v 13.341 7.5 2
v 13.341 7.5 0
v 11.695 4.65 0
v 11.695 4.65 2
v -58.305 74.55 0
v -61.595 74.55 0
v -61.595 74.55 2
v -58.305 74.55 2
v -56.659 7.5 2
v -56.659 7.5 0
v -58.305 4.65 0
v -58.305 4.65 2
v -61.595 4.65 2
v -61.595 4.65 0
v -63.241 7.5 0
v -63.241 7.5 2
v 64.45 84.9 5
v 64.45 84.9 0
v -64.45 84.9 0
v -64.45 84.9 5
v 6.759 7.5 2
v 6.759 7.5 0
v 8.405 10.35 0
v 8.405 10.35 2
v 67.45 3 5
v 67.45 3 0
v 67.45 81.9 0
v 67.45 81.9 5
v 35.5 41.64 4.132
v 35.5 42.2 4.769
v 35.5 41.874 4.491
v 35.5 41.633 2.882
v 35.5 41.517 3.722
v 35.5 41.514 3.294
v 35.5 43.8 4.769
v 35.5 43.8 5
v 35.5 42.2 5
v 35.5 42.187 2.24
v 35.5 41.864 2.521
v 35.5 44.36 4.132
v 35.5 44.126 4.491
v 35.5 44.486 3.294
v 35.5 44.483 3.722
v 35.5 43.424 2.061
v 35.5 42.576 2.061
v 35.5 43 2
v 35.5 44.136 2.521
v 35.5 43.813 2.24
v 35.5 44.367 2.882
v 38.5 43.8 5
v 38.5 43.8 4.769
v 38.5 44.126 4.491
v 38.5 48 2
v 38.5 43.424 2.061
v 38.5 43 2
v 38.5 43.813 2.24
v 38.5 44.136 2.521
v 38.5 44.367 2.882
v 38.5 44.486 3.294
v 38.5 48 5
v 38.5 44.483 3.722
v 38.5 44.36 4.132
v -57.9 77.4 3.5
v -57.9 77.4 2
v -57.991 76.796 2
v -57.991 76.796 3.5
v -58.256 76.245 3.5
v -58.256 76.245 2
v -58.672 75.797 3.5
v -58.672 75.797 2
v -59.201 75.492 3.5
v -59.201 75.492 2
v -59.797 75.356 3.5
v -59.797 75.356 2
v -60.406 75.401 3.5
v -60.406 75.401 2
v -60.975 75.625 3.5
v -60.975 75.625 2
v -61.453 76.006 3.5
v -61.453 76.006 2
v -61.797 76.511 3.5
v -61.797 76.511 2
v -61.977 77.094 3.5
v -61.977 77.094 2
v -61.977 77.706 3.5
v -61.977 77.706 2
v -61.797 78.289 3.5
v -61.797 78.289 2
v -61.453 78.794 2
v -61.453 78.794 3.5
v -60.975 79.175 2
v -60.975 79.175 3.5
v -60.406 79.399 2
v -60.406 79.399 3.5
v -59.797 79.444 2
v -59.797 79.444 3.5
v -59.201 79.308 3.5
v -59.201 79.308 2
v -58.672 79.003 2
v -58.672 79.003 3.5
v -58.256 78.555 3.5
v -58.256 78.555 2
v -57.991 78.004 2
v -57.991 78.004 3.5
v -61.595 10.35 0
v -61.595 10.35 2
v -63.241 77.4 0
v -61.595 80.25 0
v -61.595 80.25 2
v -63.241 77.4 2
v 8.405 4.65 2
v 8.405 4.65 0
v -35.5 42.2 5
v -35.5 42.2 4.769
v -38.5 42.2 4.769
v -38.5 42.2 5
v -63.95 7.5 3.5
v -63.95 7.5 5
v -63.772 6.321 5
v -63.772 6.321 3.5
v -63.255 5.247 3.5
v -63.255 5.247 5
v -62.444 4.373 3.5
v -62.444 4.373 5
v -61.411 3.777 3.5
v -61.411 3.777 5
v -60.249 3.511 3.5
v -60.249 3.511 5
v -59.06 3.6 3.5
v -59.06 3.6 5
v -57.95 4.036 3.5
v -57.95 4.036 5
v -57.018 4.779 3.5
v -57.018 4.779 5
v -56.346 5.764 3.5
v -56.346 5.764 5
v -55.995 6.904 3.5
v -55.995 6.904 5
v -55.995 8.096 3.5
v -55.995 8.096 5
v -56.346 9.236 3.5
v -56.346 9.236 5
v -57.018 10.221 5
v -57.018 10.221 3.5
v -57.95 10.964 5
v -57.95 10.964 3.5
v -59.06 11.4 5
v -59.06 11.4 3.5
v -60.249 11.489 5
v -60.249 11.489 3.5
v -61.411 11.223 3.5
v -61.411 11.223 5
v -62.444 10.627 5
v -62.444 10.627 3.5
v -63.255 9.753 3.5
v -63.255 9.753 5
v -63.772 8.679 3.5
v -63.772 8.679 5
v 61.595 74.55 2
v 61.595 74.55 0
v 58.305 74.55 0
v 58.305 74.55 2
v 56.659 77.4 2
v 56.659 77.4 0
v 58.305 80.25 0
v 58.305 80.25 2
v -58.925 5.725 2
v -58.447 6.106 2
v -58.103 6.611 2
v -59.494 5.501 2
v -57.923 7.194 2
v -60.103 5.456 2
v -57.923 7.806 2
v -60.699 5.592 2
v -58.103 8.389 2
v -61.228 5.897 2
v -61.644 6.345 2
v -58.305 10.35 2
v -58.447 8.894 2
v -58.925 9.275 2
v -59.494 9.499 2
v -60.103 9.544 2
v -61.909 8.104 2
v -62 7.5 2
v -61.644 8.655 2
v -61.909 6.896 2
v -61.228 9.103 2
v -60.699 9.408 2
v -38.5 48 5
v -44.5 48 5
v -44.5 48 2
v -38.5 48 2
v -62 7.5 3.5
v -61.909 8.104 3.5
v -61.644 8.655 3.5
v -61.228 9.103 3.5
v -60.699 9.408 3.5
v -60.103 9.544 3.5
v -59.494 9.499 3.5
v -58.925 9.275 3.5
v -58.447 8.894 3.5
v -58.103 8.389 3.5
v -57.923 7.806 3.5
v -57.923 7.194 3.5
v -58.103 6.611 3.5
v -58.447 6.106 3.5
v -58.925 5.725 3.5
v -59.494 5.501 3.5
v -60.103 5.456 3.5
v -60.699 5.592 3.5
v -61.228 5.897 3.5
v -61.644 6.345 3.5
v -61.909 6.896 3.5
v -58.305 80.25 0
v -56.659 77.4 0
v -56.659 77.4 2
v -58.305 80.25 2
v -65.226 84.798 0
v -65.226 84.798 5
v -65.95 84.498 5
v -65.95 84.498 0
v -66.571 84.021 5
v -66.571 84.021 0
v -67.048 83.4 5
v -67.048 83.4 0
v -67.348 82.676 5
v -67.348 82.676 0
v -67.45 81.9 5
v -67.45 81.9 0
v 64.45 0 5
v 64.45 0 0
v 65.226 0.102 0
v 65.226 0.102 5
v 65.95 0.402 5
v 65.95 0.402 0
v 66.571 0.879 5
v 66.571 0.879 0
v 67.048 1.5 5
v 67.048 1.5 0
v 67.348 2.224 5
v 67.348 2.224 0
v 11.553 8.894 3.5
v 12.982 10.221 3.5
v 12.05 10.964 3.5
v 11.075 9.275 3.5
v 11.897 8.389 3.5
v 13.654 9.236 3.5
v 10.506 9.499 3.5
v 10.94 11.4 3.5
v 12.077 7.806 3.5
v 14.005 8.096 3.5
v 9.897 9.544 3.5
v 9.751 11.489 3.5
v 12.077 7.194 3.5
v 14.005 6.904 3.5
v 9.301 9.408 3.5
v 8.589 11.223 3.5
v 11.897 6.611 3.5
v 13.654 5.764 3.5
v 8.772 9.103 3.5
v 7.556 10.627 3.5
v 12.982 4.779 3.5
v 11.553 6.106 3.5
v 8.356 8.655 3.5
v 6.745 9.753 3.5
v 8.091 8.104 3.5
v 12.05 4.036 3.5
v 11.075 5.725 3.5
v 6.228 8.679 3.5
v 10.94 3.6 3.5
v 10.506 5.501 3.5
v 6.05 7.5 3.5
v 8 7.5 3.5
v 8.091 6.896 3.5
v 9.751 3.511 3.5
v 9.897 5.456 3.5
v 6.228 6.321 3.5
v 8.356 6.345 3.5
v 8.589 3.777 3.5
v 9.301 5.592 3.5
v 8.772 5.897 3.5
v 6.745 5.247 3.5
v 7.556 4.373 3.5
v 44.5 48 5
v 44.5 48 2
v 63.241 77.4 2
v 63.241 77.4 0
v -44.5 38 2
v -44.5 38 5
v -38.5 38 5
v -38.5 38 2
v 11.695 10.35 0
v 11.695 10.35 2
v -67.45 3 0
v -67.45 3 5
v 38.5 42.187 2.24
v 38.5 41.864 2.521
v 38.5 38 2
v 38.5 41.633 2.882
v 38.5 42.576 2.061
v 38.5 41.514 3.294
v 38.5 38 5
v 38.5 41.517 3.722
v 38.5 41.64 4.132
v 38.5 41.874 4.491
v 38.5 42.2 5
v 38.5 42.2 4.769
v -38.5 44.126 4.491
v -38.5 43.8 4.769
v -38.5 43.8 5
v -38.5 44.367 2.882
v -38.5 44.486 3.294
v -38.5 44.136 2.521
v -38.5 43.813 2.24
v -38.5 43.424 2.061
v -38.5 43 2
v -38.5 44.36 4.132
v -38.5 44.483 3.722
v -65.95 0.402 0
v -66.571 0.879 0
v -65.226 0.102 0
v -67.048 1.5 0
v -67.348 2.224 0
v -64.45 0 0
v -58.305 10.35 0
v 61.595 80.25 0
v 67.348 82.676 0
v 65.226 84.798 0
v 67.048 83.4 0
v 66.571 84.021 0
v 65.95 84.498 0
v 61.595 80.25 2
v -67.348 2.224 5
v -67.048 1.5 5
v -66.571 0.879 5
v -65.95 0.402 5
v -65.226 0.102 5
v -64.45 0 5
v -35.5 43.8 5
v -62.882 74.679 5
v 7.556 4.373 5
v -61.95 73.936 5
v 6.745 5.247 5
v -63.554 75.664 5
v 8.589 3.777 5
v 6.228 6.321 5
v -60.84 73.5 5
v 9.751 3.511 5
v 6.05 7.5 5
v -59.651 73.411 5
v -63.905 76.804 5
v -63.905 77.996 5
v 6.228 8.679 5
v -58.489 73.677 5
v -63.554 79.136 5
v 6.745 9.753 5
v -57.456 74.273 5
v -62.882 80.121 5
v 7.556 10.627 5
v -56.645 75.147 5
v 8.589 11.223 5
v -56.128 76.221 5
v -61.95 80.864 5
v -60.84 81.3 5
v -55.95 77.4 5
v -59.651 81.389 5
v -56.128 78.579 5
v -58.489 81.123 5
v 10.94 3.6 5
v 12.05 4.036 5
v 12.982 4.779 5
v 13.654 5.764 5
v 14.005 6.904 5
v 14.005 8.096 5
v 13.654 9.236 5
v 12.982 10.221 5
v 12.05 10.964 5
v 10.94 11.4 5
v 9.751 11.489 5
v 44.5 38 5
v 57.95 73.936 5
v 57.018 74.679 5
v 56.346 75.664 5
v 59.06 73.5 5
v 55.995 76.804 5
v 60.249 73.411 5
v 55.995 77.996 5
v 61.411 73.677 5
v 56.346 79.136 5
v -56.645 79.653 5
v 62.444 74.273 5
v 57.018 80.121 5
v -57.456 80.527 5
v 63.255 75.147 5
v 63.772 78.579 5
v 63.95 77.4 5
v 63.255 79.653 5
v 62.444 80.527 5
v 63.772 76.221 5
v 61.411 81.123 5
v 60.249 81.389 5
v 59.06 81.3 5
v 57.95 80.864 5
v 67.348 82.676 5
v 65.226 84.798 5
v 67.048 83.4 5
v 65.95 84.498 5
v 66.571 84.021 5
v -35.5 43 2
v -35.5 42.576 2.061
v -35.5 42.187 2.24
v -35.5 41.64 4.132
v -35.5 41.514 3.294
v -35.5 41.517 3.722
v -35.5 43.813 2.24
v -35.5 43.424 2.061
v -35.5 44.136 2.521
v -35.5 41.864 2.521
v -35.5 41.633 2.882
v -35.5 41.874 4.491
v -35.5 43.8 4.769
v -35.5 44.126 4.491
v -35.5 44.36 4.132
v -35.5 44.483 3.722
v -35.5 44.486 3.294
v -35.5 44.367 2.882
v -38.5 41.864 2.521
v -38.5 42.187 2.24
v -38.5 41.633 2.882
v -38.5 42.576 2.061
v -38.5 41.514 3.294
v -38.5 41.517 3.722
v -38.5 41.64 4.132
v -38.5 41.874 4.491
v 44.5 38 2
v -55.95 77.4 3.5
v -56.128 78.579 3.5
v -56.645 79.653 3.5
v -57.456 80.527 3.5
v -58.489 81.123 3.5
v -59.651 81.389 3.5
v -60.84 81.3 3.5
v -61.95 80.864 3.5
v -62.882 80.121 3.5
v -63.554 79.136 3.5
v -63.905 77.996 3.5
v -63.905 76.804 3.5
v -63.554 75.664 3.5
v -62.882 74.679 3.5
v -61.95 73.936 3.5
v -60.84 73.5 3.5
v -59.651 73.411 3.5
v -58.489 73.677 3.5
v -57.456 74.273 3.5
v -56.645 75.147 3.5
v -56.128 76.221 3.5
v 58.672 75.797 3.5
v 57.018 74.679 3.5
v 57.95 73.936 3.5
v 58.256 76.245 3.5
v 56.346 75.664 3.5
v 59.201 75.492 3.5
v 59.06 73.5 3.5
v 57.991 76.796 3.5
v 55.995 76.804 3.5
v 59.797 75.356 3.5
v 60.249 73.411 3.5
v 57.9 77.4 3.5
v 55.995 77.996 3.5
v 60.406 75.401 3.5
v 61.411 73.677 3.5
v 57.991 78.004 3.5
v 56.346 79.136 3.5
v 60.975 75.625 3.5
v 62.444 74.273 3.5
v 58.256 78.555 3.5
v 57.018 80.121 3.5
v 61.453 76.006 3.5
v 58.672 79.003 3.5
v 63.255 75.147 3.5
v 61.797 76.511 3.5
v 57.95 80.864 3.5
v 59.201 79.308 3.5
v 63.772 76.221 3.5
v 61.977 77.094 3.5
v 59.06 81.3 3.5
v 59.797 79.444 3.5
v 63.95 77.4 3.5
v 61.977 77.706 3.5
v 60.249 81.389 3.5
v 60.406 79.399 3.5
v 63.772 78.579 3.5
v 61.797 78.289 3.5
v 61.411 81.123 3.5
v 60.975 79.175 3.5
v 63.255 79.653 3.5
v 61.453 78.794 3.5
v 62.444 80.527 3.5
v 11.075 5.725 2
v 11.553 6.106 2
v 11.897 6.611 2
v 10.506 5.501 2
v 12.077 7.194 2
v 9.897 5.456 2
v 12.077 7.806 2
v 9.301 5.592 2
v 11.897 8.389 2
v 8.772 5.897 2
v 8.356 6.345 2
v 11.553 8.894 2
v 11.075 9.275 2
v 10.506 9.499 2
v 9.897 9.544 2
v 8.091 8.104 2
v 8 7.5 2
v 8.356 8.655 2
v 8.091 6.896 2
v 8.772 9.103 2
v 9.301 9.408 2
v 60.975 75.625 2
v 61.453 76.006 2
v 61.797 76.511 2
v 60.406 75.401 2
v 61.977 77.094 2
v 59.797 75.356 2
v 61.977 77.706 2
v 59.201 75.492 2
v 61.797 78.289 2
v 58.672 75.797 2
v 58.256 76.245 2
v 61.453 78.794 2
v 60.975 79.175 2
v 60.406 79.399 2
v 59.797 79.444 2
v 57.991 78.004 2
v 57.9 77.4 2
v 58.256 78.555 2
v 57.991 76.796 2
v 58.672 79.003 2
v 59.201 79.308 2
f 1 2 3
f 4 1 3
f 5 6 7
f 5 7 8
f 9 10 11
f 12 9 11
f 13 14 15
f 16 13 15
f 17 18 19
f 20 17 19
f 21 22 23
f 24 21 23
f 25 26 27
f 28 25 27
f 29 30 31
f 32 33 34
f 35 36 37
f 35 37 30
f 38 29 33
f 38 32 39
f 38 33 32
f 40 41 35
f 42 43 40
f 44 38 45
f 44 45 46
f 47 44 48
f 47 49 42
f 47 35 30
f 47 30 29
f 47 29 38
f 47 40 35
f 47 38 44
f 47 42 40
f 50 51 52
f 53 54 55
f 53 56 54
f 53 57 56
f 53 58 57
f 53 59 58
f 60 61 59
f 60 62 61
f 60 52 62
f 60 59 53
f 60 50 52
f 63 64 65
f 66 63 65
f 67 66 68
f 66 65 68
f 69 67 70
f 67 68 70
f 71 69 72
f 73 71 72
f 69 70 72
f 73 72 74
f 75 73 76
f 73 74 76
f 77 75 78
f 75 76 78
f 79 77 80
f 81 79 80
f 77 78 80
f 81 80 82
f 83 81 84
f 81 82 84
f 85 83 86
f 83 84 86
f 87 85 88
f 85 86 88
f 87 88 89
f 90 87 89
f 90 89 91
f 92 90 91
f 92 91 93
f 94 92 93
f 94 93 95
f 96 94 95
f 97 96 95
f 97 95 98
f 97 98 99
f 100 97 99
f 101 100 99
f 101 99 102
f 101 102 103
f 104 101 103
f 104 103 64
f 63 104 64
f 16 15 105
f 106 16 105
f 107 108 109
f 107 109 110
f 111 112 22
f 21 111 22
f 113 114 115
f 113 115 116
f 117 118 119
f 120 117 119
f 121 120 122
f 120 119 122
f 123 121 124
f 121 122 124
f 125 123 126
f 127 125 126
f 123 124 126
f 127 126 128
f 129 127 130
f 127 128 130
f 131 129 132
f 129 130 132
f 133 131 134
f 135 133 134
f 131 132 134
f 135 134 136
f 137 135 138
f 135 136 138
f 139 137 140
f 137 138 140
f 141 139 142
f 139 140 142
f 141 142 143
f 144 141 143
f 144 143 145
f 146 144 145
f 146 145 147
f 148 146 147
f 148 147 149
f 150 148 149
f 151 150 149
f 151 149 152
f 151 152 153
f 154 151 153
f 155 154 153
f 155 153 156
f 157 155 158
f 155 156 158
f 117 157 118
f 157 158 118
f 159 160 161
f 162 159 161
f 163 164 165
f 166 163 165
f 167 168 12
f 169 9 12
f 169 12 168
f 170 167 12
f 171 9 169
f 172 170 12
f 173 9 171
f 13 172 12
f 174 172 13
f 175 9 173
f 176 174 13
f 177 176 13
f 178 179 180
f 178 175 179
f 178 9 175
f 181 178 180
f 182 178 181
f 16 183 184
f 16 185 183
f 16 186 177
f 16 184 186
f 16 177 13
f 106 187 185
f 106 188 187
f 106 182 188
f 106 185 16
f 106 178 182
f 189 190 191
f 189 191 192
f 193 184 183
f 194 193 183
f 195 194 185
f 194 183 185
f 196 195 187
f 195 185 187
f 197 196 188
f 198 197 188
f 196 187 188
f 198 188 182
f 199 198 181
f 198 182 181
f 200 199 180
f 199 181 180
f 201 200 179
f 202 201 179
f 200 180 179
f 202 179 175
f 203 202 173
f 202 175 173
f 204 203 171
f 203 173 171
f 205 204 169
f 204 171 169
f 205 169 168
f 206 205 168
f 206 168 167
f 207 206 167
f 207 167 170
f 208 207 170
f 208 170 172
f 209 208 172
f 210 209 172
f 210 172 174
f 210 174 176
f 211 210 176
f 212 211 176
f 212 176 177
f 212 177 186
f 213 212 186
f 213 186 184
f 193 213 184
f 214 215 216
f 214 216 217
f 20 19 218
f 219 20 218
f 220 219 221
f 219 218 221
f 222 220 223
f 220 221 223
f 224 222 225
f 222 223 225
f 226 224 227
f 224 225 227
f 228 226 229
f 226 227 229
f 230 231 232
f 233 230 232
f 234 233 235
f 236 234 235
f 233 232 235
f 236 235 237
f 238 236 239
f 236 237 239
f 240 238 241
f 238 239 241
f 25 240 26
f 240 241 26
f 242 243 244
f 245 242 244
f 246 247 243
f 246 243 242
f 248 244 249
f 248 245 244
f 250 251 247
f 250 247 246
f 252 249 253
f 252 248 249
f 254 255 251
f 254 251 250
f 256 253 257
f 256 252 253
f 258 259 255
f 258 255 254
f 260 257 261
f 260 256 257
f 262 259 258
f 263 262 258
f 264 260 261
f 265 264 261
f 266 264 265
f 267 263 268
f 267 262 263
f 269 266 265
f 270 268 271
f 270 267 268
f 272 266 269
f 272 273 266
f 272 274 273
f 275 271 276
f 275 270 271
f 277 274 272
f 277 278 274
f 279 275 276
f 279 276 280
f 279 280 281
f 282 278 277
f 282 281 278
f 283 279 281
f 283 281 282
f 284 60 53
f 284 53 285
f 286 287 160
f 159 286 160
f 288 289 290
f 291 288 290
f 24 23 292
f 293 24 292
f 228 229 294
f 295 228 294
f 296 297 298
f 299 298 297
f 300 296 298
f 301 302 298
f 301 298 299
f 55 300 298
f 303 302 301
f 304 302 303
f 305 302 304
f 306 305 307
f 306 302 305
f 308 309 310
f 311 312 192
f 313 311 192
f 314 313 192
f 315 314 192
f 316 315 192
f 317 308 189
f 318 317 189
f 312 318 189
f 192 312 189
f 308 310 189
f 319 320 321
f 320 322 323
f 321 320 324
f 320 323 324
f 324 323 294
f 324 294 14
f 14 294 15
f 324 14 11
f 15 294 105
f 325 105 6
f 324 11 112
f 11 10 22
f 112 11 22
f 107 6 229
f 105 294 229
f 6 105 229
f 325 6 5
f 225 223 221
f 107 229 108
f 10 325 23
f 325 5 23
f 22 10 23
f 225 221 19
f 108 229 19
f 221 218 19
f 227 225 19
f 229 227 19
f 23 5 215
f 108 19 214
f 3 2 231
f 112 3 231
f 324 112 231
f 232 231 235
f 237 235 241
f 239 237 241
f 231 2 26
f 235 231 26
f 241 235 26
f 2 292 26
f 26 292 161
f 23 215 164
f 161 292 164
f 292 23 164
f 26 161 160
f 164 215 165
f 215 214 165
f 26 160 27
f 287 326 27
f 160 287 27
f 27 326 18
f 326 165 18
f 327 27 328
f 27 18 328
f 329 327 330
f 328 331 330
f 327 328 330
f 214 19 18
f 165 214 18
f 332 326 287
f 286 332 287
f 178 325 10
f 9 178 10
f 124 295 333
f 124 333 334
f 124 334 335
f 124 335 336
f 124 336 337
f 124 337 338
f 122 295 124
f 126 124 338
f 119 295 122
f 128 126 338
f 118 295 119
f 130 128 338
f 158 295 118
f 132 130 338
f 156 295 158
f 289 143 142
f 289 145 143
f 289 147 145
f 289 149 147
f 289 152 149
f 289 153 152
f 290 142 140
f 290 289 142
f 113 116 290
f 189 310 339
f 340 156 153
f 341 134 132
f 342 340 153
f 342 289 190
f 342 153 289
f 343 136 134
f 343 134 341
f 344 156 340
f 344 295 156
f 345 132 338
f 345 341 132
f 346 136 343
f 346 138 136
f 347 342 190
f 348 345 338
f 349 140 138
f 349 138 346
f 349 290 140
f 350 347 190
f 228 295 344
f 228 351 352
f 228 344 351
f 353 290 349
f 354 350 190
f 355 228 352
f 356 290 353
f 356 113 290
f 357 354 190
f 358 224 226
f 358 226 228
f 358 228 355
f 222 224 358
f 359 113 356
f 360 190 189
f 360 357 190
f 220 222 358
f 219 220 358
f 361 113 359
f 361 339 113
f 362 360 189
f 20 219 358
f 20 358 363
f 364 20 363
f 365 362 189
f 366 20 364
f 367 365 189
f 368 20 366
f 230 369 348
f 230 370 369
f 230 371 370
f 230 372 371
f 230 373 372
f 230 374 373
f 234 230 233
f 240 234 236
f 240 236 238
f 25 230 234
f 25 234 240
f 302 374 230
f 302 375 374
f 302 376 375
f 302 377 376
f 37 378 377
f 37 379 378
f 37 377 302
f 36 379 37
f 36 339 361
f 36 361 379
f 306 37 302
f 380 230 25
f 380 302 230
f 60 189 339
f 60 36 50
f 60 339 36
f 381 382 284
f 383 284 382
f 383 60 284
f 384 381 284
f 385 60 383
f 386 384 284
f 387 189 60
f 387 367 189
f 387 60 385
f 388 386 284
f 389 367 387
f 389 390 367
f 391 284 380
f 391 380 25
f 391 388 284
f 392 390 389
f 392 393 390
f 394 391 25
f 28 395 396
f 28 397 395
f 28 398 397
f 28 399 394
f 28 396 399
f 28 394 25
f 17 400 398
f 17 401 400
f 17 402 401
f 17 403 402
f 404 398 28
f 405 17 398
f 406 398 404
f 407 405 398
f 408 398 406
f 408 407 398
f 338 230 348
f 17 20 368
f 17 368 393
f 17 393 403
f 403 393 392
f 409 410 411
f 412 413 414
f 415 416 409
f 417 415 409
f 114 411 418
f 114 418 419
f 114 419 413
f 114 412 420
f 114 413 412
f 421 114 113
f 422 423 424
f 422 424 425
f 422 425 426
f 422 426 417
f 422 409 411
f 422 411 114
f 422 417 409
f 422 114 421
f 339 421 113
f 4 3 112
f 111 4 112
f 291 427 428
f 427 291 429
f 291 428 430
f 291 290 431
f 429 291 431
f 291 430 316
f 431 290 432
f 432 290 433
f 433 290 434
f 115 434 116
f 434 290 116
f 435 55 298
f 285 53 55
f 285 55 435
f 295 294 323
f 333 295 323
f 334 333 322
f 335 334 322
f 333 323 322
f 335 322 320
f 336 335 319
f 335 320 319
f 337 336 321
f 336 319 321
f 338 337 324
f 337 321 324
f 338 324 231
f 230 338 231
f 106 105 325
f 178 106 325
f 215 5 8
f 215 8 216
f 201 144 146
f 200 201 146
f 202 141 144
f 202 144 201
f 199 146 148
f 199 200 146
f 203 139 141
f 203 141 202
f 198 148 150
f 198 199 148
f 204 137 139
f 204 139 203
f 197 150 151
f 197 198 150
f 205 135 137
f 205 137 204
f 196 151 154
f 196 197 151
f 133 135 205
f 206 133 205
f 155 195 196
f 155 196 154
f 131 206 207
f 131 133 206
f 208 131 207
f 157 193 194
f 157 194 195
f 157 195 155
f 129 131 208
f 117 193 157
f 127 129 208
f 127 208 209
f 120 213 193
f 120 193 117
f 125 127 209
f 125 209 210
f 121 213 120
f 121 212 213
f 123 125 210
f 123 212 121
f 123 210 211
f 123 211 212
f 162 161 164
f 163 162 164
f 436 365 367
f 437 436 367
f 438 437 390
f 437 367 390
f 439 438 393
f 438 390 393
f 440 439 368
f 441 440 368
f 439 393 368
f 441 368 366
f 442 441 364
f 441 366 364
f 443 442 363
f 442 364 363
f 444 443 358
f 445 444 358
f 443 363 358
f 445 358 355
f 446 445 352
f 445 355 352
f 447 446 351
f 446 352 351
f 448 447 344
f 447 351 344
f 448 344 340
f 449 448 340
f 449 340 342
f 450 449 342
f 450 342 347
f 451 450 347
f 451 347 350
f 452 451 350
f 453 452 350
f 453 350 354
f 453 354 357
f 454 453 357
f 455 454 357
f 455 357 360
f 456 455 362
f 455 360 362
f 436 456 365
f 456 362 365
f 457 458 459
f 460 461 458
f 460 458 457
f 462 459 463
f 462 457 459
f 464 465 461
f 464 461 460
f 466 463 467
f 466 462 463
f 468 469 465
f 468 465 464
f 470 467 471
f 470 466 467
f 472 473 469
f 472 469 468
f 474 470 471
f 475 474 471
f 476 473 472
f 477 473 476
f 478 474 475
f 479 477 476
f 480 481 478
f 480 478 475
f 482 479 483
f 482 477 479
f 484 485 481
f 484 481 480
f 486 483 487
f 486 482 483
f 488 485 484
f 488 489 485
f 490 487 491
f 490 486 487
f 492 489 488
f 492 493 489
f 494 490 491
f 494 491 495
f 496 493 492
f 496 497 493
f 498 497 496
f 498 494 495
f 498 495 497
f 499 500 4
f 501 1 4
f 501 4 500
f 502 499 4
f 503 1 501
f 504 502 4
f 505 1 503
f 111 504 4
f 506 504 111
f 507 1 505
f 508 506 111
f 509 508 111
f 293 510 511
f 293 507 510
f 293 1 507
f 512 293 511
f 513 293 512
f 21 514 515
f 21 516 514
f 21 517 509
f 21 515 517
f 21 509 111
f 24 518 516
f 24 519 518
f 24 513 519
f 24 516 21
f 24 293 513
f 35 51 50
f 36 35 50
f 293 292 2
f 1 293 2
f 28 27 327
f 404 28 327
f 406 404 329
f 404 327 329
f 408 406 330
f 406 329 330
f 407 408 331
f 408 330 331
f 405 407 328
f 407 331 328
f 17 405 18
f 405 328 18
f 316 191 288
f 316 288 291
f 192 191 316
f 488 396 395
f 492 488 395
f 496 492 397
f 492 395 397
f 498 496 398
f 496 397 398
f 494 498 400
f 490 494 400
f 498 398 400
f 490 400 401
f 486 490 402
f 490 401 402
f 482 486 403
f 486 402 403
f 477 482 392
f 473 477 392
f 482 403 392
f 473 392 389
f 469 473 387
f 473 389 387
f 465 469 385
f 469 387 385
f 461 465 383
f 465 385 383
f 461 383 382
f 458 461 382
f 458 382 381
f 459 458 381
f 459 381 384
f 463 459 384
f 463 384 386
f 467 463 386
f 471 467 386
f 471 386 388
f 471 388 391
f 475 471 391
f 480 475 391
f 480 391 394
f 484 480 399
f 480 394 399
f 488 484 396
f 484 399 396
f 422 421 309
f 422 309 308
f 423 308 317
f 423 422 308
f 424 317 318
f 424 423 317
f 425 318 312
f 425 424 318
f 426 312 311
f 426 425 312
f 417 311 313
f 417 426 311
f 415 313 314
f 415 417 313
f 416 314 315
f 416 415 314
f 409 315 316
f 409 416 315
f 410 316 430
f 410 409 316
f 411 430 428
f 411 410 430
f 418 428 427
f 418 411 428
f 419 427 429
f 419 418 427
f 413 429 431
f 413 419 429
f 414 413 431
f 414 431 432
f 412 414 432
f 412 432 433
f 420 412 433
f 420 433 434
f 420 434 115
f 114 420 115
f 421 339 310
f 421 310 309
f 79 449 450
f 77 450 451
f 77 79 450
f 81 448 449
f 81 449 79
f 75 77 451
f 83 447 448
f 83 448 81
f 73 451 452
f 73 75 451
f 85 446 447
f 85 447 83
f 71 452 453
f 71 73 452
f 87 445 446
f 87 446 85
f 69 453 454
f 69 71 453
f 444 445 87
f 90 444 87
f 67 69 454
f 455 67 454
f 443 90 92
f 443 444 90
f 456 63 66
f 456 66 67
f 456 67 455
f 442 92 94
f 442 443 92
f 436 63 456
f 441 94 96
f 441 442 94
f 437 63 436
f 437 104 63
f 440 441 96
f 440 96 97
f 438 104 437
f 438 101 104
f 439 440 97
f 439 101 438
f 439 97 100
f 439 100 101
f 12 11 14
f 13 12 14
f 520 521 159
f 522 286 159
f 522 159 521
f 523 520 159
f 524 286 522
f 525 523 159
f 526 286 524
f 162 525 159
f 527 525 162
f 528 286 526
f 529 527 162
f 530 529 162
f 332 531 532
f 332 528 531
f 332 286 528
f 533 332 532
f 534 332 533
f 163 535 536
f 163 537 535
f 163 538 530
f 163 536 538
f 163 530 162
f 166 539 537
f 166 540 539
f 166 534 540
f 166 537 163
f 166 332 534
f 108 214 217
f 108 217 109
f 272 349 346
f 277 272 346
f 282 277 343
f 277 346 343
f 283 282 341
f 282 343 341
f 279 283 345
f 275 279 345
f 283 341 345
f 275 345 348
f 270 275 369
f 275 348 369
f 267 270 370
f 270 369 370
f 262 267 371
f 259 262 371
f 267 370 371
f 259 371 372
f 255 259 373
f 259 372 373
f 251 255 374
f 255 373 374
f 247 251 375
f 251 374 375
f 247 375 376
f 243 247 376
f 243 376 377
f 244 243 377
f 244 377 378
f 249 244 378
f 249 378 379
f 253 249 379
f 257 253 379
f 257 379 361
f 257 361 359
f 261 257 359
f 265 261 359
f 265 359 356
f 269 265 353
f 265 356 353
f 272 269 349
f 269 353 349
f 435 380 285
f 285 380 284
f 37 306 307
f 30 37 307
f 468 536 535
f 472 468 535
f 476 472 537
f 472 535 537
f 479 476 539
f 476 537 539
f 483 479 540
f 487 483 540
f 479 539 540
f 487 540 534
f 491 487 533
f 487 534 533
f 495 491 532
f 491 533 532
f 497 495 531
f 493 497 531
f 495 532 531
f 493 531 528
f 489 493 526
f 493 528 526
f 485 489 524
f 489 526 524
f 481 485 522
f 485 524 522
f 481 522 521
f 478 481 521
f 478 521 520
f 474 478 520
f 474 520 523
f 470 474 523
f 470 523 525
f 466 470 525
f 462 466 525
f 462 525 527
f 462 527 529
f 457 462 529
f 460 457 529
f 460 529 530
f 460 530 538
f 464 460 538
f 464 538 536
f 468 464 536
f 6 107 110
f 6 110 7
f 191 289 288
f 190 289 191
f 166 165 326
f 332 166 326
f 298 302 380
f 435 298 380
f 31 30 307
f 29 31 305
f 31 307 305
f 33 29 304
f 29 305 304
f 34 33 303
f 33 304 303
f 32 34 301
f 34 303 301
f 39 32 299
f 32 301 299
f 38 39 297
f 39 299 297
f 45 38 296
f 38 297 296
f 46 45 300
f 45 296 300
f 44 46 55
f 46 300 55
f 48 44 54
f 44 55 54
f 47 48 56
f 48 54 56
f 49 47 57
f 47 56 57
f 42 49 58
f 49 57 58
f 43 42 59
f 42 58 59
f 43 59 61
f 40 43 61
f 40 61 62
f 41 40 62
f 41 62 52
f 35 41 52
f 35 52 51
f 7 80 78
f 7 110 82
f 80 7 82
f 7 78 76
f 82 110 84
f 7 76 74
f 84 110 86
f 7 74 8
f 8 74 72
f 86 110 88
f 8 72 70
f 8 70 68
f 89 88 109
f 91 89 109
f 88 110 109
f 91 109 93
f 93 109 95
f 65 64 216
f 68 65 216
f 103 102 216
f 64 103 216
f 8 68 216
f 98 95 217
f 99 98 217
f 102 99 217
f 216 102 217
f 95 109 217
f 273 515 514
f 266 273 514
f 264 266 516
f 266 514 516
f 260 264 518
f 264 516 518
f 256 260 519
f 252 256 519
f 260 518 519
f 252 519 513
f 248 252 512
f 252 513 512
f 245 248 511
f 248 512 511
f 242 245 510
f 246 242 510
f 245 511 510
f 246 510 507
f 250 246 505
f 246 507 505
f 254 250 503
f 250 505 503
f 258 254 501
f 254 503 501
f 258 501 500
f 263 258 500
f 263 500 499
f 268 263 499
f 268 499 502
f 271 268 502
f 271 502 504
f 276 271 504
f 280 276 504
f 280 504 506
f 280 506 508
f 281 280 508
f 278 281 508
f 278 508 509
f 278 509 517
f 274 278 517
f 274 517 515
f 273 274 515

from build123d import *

# Parameters (mm, degrees)
EXTRUDE_1_DEPTH     = 5
CUT_EXTRUDE_1_DEPTH = 2
SKETCH_3_R          = 2.05
CUT_EXTRUDE_2_DEPTH = 3
SKETCH_4_R          = 4
CUT_EXTRUDE_3_DEPTH = 1.5
SKETCH_5_W          = 6
SKETCH_5_H          = 10
CUT_EXTRUDE_4_DEPTH = 3
CUT_EXTRUDE_5_DEPTH = 3
CUT_EXTRUDE_START   = -3
CUT_EXTRUDE_6_DEPTH = 3


with BuildPart() as part:
    # 草图1 → 凸台-拉伸1 (new body)
    with BuildSketch(Plane.XY):
        with BuildLine():
            Line((-64.45, 0), (64.45, 0))
            ThreePointArc((64.45, 0), (66.571320344, 0.878679656), (67.45, 3))
            Line((67.45, 3), (67.45, 81.9))
            ThreePointArc((67.45, 81.9), (66.571320344, 84.021320344), (64.45, 84.9))
            Line((64.45, 84.9), (-64.45, 84.9))
            ThreePointArc((-64.45, 84.9), (-66.571320344, 84.021320344), (-67.45, 81.9))
            Line((-67.45, 81.9), (-67.45, 3))
            ThreePointArc((-67.45, 3), (-66.571320344, 0.878679656), (-64.45, 0))
        make_face()
    extrude(amount=EXTRUDE_1_DEPTH)

    # 草图2 → 切除-拉伸1 (cut)
    with BuildSketch(Plane(origin=(0, 0, 0), x_dir=(-1, 0, 0), z_dir=(0, 0, -1))):
        Polygon((-56.659103466, 77.4), (-58.304551733, 80.25), (-61.595448267, 80.25), (-63.240896534, 77.4), (-61.595448267, 74.55), (-58.304551733, 74.55), align=None)
        Polygon((58.304551733, 74.55), (56.659103466, 77.4), (58.304551733, 80.25), (61.595448267, 80.25), (63.240896534, 77.4), (61.595448267, 74.55), align=None)
        Polygon((-13.340896534, 7.5), (-11.695448267, 4.65), (-8.404551733, 4.65), (-6.759103466, 7.5), (-8.404551733, 10.35), (-11.695448267, 10.35), align=None)
        Polygon((56.659103466, 7.5), (58.304551733, 4.65), (61.595448267, 4.65), (63.240896534, 7.5), (61.595448267, 10.35), (58.304551733, 10.35), align=None)
    extrude(amount=-CUT_EXTRUDE_1_DEPTH, mode=Mode.SUBTRACT)

    # 草图3 → 切除-拉伸2 (cut)
    with BuildSketch(Plane(origin=(0, 0, 2), x_dir=(-1, 0, 0), z_dir=(0, 0, -1))):
        with Locations((-59.95, 77.4)):
            Circle(SKETCH_3_R)
        with Locations(Location((59.95, 77.4, 0), (0, 0, 180))):
            Circle(SKETCH_3_R)
        with Locations((-10.05, 7.5)):
            Circle(SKETCH_3_R)
        with Locations((59.95, 7.5)):
            Circle(SKETCH_3_R)
    extrude(amount=-CUT_EXTRUDE_2_DEPTH, mode=Mode.SUBTRACT)

    # 草图4 → 切除-拉伸3 (cut)
    with BuildSketch(Plane.XY.offset(5)):
        with Locations((-59.95, 77.4)):
            Circle(SKETCH_4_R)
        with Locations((59.95, 77.4)):
            Circle(SKETCH_4_R)
        with Locations(Location((-59.95, 7.5, 0), (0, 0, 180))):
            Circle(SKETCH_4_R)
        with Locations(Location((10.05, 7.5, 0), (0, 0, 180))):
            Circle(SKETCH_4_R)
    extrude(amount=-CUT_EXTRUDE_3_DEPTH, mode=Mode.SUBTRACT)

    # 草图5 → 切除-拉伸4 (cut)
    with BuildSketch(Plane.XY.offset(5)):
        with Locations((-41.5, 43)):
            Rectangle(SKETCH_5_W, SKETCH_5_H)
        with Locations((41.5, 43)):
            Rectangle(SKETCH_5_W, SKETCH_5_H)
    extrude(amount=-CUT_EXTRUDE_4_DEPTH, mode=Mode.SUBTRACT)

    # 草图6 → 切除-拉伸5 (cut)
    with BuildSketch(Plane(origin=(38.5, 0, 0), x_dir=(0, 0, -1), z_dir=(1, 0, 0))):
        with BuildLine():
            Line((-4.768857754, 43.8), (-5, 43.8))
            Line((-5, 43.8), (-5, 42.2))
            Line((-5, 42.2), (-4.768857754, 42.2))
            ThreePointArc((-4.768857754, 42.2), (-2, 43), (-4.768857754, 43.8))
        make_face()
    extrude(amount=-CUT_EXTRUDE_5_DEPTH, mode=Mode.SUBTRACT)

    # 草图7 → 切除-拉伸6 (cut)
    with BuildSketch(Plane.ZY.offset(38.5).offset(CUT_EXTRUDE_START)):
        with BuildLine():
            Line((5, 43.8), (4.768857754, 43.8))
            ThreePointArc((4.768857754, 43.8), (2, 43), (4.768857754, 42.2))
            Line((4.768857754, 42.2), (5, 42.2))
            Line((5, 42.2), (5, 43.8))
        make_face()
    extrude(amount=CUT_EXTRUDE_6_DEPTH, mode=Mode.SUBTRACT)


solid = part.part
